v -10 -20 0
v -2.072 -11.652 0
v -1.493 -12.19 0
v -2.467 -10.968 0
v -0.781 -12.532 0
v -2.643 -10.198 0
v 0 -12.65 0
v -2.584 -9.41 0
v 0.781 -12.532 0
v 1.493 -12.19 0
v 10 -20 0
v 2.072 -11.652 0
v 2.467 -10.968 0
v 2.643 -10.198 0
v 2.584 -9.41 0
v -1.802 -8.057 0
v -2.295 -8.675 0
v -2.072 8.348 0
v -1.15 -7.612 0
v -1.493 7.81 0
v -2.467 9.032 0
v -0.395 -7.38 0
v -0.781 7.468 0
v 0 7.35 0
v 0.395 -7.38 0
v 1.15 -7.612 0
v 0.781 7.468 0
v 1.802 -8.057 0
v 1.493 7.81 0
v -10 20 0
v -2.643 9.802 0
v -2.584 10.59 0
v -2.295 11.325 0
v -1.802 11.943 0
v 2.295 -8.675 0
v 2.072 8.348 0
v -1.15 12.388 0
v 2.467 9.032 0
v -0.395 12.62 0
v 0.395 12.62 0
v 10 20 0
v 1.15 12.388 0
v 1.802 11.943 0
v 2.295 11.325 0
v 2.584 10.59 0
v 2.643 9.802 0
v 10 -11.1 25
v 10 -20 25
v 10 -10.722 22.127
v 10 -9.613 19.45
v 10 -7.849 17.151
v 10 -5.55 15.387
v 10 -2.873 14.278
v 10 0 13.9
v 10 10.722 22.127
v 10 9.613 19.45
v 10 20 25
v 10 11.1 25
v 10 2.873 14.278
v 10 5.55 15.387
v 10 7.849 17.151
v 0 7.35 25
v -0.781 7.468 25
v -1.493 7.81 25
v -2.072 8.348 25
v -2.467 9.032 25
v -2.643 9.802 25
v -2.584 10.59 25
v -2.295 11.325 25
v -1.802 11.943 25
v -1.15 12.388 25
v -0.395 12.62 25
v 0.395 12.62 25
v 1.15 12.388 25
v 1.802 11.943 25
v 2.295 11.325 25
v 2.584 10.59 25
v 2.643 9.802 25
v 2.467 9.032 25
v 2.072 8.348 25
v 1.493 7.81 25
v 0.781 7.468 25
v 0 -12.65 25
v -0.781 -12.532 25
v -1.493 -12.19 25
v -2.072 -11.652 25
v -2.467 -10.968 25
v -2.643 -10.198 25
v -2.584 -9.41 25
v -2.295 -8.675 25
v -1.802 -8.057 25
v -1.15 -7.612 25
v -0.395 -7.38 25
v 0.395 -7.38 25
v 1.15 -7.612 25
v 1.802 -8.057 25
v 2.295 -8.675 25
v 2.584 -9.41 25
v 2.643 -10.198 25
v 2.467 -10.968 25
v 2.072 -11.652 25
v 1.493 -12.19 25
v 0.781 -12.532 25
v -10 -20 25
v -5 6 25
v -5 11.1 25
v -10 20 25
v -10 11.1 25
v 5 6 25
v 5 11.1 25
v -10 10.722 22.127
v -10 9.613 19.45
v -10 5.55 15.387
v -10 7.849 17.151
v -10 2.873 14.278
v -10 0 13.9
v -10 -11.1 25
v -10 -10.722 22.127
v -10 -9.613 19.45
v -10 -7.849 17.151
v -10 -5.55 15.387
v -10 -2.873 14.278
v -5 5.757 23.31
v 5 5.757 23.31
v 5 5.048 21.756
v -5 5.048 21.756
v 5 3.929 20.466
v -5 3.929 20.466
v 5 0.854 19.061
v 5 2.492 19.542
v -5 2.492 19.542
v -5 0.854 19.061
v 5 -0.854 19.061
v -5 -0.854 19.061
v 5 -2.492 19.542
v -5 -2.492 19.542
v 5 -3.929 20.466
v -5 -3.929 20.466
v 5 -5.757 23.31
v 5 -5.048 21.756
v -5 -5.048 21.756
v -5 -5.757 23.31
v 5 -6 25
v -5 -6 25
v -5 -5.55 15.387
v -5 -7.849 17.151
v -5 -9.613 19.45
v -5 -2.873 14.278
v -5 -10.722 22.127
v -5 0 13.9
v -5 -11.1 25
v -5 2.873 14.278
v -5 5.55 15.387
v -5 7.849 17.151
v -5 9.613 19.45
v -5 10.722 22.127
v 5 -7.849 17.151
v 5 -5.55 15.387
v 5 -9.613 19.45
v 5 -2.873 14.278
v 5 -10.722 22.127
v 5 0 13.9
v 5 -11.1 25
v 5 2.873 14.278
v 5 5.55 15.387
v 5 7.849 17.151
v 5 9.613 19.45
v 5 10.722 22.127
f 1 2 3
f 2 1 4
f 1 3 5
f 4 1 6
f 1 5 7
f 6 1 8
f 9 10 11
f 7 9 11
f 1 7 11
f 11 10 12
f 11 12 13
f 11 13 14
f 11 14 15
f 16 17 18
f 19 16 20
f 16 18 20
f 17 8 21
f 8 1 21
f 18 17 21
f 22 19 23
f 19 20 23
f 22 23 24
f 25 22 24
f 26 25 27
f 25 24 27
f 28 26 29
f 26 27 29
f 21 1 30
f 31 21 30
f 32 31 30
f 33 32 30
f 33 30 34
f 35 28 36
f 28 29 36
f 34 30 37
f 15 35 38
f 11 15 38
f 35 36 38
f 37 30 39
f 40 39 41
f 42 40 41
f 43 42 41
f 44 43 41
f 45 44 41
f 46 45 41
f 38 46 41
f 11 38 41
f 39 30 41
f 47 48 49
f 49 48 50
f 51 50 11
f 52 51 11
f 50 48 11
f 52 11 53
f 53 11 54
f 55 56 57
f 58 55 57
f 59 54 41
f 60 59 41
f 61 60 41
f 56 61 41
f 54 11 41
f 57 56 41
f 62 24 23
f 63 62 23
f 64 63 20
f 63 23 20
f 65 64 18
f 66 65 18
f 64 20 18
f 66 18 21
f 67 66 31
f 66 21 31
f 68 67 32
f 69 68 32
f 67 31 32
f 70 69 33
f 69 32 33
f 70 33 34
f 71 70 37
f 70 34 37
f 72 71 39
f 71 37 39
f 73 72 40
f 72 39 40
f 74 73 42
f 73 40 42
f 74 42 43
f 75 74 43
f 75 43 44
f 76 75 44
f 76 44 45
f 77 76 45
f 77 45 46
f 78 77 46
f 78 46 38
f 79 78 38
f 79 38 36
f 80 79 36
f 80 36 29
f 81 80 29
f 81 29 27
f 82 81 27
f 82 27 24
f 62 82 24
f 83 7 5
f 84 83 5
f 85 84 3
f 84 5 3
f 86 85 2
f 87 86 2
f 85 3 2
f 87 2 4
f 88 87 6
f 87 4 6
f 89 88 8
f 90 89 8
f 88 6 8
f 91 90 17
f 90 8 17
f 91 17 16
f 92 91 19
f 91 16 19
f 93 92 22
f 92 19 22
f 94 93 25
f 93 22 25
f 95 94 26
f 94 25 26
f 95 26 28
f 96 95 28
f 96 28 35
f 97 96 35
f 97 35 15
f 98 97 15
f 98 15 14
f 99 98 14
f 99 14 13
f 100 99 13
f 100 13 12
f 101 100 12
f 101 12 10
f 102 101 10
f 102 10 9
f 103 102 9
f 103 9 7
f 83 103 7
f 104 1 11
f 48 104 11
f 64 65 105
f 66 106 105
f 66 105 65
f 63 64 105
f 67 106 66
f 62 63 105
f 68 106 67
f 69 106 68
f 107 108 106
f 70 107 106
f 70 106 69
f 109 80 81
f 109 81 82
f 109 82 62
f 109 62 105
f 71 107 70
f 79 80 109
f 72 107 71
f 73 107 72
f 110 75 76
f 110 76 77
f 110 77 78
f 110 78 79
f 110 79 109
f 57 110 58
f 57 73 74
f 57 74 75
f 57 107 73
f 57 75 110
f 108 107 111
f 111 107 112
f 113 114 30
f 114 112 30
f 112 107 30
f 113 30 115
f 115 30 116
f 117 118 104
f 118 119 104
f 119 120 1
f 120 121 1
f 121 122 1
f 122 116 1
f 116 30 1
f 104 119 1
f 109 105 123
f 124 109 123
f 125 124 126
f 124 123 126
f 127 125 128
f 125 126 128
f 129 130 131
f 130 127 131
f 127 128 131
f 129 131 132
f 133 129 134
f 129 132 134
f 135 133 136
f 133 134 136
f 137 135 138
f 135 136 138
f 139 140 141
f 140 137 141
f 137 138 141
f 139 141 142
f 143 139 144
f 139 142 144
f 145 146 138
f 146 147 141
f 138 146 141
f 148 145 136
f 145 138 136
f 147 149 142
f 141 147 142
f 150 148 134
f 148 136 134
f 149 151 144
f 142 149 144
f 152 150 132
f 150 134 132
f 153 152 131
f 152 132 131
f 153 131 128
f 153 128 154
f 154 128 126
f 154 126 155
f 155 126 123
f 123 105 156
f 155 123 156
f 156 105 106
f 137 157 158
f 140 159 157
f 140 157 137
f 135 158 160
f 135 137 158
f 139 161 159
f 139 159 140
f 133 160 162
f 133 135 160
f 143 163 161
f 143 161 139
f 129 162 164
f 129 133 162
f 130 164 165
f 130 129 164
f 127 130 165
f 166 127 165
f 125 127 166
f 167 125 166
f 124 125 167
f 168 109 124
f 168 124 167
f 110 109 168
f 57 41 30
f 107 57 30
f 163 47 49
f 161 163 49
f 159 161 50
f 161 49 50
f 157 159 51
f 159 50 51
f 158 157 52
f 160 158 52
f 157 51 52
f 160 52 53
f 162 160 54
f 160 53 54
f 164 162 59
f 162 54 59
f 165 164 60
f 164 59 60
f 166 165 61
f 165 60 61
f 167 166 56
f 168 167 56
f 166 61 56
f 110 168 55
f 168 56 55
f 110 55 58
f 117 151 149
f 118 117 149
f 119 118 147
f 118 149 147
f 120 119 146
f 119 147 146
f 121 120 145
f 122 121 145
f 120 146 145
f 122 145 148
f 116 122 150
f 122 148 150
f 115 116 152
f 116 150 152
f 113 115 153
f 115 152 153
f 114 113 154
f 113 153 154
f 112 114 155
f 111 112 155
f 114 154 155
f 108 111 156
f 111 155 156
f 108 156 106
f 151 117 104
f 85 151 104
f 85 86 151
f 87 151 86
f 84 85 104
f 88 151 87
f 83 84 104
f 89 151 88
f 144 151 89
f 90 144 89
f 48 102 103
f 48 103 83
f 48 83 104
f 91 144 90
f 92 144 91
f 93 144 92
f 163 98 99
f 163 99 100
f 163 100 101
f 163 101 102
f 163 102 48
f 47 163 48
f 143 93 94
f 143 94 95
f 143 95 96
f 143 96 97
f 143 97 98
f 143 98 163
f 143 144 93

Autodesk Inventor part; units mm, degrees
ref_plane "YZ Plane" through (0, 0, 0) normal (1, 0, 0) x (0, 1, 0)
ref_plane "XZ Plane" through (0, 0, 0) normal (0, 1, 0) x (-1, 0, 0)
ref_plane "XY Plane" through (0, 0, 0) normal (0, 0, 1) x (1, 0, 0)
sketch "スケッチ1" plane through (0, 0, 0) normal (0, 0, 1) x (1, 0, 0)
  line L0 (-10, -20) -> (10, -20)
  line L1 (10, -20) -> (10, 20)
  line L2 (10, 20) -> (-10, 20)
  line L3 (-10, 20) -> (-10, -20)
  line L4 (-10, -20) -> (10, 20) construction
  line L5 (10, -20) -> (-10, 20) construction
  point P0 (0, 0)
  dimension "d0" = 20
  dimension "d1" = 40
extrude "押し出し1" add sketch "スケッチ1" along normal blind 25
sketch "スケッチ2" plane through (10, -20, 0) normal (1, 0, 0) x (0, 0, -1)
  circle A0 centre (-25, 20) radius 11.1
  line L0 (0, 40) -> (-25, 40) projected
  dimension "d4" = 22.2
  dimension "d7" = 20
extrude "押し出し2" cut sketch "スケッチ2" against normal through all
sketch "スケッチ7" plane through (0, 0, 0) normal (1, 0, 0) x (0, 1, 0)
  arc A0 (-11.1, 25) -> (11.1, 25) centre (0, 25) ccw projected
  line L0 (20, 25) -> (11.1, 25) projected
  line L1 (20, 0) -> (20, 25) projected
  line L2 (20, 0) -> (-20, 0) projected
  line L3 (-20, 0) -> (-20, 25) projected
  line L4 (-11.1, 25) -> (-20, 25) projected
  circle A1 centre (0, 25) radius 6
  arc A2 (-11.1, 25) -> (11.1, 25) centre (0, 25) ccw projected
  line L5 (11.1, 25) -> (-11.1, 25)
  point P0 (0, 0)
  point P1 (-6, 25)
  point P2 (6, 25)
  dimension "d27" = 12
extrude "押し出し5" add sketch "スケッチ7" along normal mid plane 10 contours L5 A1 A0
sketch "スケッチ5" plane through (0, 0, 25) normal (0, 0, 1) x (1, 0, 0)
  line L0 (10, 20) -> (-10, 20) projected
  line L1 (-10, -20) -> (10, -20) projected
  point P0 (0, 0)
  point P1 (0, 10)
  point P2 (0, -10)
  dimension "d18" = 10
  dimension "d19" = 10
hole "穴1" at (0, 10, 25) at (0, -10, 25) direction (0, 0, -1) diameter 5.3 depth 58
properties part number "Print_Parts_A2" material "PC/ABS プラスチック"
